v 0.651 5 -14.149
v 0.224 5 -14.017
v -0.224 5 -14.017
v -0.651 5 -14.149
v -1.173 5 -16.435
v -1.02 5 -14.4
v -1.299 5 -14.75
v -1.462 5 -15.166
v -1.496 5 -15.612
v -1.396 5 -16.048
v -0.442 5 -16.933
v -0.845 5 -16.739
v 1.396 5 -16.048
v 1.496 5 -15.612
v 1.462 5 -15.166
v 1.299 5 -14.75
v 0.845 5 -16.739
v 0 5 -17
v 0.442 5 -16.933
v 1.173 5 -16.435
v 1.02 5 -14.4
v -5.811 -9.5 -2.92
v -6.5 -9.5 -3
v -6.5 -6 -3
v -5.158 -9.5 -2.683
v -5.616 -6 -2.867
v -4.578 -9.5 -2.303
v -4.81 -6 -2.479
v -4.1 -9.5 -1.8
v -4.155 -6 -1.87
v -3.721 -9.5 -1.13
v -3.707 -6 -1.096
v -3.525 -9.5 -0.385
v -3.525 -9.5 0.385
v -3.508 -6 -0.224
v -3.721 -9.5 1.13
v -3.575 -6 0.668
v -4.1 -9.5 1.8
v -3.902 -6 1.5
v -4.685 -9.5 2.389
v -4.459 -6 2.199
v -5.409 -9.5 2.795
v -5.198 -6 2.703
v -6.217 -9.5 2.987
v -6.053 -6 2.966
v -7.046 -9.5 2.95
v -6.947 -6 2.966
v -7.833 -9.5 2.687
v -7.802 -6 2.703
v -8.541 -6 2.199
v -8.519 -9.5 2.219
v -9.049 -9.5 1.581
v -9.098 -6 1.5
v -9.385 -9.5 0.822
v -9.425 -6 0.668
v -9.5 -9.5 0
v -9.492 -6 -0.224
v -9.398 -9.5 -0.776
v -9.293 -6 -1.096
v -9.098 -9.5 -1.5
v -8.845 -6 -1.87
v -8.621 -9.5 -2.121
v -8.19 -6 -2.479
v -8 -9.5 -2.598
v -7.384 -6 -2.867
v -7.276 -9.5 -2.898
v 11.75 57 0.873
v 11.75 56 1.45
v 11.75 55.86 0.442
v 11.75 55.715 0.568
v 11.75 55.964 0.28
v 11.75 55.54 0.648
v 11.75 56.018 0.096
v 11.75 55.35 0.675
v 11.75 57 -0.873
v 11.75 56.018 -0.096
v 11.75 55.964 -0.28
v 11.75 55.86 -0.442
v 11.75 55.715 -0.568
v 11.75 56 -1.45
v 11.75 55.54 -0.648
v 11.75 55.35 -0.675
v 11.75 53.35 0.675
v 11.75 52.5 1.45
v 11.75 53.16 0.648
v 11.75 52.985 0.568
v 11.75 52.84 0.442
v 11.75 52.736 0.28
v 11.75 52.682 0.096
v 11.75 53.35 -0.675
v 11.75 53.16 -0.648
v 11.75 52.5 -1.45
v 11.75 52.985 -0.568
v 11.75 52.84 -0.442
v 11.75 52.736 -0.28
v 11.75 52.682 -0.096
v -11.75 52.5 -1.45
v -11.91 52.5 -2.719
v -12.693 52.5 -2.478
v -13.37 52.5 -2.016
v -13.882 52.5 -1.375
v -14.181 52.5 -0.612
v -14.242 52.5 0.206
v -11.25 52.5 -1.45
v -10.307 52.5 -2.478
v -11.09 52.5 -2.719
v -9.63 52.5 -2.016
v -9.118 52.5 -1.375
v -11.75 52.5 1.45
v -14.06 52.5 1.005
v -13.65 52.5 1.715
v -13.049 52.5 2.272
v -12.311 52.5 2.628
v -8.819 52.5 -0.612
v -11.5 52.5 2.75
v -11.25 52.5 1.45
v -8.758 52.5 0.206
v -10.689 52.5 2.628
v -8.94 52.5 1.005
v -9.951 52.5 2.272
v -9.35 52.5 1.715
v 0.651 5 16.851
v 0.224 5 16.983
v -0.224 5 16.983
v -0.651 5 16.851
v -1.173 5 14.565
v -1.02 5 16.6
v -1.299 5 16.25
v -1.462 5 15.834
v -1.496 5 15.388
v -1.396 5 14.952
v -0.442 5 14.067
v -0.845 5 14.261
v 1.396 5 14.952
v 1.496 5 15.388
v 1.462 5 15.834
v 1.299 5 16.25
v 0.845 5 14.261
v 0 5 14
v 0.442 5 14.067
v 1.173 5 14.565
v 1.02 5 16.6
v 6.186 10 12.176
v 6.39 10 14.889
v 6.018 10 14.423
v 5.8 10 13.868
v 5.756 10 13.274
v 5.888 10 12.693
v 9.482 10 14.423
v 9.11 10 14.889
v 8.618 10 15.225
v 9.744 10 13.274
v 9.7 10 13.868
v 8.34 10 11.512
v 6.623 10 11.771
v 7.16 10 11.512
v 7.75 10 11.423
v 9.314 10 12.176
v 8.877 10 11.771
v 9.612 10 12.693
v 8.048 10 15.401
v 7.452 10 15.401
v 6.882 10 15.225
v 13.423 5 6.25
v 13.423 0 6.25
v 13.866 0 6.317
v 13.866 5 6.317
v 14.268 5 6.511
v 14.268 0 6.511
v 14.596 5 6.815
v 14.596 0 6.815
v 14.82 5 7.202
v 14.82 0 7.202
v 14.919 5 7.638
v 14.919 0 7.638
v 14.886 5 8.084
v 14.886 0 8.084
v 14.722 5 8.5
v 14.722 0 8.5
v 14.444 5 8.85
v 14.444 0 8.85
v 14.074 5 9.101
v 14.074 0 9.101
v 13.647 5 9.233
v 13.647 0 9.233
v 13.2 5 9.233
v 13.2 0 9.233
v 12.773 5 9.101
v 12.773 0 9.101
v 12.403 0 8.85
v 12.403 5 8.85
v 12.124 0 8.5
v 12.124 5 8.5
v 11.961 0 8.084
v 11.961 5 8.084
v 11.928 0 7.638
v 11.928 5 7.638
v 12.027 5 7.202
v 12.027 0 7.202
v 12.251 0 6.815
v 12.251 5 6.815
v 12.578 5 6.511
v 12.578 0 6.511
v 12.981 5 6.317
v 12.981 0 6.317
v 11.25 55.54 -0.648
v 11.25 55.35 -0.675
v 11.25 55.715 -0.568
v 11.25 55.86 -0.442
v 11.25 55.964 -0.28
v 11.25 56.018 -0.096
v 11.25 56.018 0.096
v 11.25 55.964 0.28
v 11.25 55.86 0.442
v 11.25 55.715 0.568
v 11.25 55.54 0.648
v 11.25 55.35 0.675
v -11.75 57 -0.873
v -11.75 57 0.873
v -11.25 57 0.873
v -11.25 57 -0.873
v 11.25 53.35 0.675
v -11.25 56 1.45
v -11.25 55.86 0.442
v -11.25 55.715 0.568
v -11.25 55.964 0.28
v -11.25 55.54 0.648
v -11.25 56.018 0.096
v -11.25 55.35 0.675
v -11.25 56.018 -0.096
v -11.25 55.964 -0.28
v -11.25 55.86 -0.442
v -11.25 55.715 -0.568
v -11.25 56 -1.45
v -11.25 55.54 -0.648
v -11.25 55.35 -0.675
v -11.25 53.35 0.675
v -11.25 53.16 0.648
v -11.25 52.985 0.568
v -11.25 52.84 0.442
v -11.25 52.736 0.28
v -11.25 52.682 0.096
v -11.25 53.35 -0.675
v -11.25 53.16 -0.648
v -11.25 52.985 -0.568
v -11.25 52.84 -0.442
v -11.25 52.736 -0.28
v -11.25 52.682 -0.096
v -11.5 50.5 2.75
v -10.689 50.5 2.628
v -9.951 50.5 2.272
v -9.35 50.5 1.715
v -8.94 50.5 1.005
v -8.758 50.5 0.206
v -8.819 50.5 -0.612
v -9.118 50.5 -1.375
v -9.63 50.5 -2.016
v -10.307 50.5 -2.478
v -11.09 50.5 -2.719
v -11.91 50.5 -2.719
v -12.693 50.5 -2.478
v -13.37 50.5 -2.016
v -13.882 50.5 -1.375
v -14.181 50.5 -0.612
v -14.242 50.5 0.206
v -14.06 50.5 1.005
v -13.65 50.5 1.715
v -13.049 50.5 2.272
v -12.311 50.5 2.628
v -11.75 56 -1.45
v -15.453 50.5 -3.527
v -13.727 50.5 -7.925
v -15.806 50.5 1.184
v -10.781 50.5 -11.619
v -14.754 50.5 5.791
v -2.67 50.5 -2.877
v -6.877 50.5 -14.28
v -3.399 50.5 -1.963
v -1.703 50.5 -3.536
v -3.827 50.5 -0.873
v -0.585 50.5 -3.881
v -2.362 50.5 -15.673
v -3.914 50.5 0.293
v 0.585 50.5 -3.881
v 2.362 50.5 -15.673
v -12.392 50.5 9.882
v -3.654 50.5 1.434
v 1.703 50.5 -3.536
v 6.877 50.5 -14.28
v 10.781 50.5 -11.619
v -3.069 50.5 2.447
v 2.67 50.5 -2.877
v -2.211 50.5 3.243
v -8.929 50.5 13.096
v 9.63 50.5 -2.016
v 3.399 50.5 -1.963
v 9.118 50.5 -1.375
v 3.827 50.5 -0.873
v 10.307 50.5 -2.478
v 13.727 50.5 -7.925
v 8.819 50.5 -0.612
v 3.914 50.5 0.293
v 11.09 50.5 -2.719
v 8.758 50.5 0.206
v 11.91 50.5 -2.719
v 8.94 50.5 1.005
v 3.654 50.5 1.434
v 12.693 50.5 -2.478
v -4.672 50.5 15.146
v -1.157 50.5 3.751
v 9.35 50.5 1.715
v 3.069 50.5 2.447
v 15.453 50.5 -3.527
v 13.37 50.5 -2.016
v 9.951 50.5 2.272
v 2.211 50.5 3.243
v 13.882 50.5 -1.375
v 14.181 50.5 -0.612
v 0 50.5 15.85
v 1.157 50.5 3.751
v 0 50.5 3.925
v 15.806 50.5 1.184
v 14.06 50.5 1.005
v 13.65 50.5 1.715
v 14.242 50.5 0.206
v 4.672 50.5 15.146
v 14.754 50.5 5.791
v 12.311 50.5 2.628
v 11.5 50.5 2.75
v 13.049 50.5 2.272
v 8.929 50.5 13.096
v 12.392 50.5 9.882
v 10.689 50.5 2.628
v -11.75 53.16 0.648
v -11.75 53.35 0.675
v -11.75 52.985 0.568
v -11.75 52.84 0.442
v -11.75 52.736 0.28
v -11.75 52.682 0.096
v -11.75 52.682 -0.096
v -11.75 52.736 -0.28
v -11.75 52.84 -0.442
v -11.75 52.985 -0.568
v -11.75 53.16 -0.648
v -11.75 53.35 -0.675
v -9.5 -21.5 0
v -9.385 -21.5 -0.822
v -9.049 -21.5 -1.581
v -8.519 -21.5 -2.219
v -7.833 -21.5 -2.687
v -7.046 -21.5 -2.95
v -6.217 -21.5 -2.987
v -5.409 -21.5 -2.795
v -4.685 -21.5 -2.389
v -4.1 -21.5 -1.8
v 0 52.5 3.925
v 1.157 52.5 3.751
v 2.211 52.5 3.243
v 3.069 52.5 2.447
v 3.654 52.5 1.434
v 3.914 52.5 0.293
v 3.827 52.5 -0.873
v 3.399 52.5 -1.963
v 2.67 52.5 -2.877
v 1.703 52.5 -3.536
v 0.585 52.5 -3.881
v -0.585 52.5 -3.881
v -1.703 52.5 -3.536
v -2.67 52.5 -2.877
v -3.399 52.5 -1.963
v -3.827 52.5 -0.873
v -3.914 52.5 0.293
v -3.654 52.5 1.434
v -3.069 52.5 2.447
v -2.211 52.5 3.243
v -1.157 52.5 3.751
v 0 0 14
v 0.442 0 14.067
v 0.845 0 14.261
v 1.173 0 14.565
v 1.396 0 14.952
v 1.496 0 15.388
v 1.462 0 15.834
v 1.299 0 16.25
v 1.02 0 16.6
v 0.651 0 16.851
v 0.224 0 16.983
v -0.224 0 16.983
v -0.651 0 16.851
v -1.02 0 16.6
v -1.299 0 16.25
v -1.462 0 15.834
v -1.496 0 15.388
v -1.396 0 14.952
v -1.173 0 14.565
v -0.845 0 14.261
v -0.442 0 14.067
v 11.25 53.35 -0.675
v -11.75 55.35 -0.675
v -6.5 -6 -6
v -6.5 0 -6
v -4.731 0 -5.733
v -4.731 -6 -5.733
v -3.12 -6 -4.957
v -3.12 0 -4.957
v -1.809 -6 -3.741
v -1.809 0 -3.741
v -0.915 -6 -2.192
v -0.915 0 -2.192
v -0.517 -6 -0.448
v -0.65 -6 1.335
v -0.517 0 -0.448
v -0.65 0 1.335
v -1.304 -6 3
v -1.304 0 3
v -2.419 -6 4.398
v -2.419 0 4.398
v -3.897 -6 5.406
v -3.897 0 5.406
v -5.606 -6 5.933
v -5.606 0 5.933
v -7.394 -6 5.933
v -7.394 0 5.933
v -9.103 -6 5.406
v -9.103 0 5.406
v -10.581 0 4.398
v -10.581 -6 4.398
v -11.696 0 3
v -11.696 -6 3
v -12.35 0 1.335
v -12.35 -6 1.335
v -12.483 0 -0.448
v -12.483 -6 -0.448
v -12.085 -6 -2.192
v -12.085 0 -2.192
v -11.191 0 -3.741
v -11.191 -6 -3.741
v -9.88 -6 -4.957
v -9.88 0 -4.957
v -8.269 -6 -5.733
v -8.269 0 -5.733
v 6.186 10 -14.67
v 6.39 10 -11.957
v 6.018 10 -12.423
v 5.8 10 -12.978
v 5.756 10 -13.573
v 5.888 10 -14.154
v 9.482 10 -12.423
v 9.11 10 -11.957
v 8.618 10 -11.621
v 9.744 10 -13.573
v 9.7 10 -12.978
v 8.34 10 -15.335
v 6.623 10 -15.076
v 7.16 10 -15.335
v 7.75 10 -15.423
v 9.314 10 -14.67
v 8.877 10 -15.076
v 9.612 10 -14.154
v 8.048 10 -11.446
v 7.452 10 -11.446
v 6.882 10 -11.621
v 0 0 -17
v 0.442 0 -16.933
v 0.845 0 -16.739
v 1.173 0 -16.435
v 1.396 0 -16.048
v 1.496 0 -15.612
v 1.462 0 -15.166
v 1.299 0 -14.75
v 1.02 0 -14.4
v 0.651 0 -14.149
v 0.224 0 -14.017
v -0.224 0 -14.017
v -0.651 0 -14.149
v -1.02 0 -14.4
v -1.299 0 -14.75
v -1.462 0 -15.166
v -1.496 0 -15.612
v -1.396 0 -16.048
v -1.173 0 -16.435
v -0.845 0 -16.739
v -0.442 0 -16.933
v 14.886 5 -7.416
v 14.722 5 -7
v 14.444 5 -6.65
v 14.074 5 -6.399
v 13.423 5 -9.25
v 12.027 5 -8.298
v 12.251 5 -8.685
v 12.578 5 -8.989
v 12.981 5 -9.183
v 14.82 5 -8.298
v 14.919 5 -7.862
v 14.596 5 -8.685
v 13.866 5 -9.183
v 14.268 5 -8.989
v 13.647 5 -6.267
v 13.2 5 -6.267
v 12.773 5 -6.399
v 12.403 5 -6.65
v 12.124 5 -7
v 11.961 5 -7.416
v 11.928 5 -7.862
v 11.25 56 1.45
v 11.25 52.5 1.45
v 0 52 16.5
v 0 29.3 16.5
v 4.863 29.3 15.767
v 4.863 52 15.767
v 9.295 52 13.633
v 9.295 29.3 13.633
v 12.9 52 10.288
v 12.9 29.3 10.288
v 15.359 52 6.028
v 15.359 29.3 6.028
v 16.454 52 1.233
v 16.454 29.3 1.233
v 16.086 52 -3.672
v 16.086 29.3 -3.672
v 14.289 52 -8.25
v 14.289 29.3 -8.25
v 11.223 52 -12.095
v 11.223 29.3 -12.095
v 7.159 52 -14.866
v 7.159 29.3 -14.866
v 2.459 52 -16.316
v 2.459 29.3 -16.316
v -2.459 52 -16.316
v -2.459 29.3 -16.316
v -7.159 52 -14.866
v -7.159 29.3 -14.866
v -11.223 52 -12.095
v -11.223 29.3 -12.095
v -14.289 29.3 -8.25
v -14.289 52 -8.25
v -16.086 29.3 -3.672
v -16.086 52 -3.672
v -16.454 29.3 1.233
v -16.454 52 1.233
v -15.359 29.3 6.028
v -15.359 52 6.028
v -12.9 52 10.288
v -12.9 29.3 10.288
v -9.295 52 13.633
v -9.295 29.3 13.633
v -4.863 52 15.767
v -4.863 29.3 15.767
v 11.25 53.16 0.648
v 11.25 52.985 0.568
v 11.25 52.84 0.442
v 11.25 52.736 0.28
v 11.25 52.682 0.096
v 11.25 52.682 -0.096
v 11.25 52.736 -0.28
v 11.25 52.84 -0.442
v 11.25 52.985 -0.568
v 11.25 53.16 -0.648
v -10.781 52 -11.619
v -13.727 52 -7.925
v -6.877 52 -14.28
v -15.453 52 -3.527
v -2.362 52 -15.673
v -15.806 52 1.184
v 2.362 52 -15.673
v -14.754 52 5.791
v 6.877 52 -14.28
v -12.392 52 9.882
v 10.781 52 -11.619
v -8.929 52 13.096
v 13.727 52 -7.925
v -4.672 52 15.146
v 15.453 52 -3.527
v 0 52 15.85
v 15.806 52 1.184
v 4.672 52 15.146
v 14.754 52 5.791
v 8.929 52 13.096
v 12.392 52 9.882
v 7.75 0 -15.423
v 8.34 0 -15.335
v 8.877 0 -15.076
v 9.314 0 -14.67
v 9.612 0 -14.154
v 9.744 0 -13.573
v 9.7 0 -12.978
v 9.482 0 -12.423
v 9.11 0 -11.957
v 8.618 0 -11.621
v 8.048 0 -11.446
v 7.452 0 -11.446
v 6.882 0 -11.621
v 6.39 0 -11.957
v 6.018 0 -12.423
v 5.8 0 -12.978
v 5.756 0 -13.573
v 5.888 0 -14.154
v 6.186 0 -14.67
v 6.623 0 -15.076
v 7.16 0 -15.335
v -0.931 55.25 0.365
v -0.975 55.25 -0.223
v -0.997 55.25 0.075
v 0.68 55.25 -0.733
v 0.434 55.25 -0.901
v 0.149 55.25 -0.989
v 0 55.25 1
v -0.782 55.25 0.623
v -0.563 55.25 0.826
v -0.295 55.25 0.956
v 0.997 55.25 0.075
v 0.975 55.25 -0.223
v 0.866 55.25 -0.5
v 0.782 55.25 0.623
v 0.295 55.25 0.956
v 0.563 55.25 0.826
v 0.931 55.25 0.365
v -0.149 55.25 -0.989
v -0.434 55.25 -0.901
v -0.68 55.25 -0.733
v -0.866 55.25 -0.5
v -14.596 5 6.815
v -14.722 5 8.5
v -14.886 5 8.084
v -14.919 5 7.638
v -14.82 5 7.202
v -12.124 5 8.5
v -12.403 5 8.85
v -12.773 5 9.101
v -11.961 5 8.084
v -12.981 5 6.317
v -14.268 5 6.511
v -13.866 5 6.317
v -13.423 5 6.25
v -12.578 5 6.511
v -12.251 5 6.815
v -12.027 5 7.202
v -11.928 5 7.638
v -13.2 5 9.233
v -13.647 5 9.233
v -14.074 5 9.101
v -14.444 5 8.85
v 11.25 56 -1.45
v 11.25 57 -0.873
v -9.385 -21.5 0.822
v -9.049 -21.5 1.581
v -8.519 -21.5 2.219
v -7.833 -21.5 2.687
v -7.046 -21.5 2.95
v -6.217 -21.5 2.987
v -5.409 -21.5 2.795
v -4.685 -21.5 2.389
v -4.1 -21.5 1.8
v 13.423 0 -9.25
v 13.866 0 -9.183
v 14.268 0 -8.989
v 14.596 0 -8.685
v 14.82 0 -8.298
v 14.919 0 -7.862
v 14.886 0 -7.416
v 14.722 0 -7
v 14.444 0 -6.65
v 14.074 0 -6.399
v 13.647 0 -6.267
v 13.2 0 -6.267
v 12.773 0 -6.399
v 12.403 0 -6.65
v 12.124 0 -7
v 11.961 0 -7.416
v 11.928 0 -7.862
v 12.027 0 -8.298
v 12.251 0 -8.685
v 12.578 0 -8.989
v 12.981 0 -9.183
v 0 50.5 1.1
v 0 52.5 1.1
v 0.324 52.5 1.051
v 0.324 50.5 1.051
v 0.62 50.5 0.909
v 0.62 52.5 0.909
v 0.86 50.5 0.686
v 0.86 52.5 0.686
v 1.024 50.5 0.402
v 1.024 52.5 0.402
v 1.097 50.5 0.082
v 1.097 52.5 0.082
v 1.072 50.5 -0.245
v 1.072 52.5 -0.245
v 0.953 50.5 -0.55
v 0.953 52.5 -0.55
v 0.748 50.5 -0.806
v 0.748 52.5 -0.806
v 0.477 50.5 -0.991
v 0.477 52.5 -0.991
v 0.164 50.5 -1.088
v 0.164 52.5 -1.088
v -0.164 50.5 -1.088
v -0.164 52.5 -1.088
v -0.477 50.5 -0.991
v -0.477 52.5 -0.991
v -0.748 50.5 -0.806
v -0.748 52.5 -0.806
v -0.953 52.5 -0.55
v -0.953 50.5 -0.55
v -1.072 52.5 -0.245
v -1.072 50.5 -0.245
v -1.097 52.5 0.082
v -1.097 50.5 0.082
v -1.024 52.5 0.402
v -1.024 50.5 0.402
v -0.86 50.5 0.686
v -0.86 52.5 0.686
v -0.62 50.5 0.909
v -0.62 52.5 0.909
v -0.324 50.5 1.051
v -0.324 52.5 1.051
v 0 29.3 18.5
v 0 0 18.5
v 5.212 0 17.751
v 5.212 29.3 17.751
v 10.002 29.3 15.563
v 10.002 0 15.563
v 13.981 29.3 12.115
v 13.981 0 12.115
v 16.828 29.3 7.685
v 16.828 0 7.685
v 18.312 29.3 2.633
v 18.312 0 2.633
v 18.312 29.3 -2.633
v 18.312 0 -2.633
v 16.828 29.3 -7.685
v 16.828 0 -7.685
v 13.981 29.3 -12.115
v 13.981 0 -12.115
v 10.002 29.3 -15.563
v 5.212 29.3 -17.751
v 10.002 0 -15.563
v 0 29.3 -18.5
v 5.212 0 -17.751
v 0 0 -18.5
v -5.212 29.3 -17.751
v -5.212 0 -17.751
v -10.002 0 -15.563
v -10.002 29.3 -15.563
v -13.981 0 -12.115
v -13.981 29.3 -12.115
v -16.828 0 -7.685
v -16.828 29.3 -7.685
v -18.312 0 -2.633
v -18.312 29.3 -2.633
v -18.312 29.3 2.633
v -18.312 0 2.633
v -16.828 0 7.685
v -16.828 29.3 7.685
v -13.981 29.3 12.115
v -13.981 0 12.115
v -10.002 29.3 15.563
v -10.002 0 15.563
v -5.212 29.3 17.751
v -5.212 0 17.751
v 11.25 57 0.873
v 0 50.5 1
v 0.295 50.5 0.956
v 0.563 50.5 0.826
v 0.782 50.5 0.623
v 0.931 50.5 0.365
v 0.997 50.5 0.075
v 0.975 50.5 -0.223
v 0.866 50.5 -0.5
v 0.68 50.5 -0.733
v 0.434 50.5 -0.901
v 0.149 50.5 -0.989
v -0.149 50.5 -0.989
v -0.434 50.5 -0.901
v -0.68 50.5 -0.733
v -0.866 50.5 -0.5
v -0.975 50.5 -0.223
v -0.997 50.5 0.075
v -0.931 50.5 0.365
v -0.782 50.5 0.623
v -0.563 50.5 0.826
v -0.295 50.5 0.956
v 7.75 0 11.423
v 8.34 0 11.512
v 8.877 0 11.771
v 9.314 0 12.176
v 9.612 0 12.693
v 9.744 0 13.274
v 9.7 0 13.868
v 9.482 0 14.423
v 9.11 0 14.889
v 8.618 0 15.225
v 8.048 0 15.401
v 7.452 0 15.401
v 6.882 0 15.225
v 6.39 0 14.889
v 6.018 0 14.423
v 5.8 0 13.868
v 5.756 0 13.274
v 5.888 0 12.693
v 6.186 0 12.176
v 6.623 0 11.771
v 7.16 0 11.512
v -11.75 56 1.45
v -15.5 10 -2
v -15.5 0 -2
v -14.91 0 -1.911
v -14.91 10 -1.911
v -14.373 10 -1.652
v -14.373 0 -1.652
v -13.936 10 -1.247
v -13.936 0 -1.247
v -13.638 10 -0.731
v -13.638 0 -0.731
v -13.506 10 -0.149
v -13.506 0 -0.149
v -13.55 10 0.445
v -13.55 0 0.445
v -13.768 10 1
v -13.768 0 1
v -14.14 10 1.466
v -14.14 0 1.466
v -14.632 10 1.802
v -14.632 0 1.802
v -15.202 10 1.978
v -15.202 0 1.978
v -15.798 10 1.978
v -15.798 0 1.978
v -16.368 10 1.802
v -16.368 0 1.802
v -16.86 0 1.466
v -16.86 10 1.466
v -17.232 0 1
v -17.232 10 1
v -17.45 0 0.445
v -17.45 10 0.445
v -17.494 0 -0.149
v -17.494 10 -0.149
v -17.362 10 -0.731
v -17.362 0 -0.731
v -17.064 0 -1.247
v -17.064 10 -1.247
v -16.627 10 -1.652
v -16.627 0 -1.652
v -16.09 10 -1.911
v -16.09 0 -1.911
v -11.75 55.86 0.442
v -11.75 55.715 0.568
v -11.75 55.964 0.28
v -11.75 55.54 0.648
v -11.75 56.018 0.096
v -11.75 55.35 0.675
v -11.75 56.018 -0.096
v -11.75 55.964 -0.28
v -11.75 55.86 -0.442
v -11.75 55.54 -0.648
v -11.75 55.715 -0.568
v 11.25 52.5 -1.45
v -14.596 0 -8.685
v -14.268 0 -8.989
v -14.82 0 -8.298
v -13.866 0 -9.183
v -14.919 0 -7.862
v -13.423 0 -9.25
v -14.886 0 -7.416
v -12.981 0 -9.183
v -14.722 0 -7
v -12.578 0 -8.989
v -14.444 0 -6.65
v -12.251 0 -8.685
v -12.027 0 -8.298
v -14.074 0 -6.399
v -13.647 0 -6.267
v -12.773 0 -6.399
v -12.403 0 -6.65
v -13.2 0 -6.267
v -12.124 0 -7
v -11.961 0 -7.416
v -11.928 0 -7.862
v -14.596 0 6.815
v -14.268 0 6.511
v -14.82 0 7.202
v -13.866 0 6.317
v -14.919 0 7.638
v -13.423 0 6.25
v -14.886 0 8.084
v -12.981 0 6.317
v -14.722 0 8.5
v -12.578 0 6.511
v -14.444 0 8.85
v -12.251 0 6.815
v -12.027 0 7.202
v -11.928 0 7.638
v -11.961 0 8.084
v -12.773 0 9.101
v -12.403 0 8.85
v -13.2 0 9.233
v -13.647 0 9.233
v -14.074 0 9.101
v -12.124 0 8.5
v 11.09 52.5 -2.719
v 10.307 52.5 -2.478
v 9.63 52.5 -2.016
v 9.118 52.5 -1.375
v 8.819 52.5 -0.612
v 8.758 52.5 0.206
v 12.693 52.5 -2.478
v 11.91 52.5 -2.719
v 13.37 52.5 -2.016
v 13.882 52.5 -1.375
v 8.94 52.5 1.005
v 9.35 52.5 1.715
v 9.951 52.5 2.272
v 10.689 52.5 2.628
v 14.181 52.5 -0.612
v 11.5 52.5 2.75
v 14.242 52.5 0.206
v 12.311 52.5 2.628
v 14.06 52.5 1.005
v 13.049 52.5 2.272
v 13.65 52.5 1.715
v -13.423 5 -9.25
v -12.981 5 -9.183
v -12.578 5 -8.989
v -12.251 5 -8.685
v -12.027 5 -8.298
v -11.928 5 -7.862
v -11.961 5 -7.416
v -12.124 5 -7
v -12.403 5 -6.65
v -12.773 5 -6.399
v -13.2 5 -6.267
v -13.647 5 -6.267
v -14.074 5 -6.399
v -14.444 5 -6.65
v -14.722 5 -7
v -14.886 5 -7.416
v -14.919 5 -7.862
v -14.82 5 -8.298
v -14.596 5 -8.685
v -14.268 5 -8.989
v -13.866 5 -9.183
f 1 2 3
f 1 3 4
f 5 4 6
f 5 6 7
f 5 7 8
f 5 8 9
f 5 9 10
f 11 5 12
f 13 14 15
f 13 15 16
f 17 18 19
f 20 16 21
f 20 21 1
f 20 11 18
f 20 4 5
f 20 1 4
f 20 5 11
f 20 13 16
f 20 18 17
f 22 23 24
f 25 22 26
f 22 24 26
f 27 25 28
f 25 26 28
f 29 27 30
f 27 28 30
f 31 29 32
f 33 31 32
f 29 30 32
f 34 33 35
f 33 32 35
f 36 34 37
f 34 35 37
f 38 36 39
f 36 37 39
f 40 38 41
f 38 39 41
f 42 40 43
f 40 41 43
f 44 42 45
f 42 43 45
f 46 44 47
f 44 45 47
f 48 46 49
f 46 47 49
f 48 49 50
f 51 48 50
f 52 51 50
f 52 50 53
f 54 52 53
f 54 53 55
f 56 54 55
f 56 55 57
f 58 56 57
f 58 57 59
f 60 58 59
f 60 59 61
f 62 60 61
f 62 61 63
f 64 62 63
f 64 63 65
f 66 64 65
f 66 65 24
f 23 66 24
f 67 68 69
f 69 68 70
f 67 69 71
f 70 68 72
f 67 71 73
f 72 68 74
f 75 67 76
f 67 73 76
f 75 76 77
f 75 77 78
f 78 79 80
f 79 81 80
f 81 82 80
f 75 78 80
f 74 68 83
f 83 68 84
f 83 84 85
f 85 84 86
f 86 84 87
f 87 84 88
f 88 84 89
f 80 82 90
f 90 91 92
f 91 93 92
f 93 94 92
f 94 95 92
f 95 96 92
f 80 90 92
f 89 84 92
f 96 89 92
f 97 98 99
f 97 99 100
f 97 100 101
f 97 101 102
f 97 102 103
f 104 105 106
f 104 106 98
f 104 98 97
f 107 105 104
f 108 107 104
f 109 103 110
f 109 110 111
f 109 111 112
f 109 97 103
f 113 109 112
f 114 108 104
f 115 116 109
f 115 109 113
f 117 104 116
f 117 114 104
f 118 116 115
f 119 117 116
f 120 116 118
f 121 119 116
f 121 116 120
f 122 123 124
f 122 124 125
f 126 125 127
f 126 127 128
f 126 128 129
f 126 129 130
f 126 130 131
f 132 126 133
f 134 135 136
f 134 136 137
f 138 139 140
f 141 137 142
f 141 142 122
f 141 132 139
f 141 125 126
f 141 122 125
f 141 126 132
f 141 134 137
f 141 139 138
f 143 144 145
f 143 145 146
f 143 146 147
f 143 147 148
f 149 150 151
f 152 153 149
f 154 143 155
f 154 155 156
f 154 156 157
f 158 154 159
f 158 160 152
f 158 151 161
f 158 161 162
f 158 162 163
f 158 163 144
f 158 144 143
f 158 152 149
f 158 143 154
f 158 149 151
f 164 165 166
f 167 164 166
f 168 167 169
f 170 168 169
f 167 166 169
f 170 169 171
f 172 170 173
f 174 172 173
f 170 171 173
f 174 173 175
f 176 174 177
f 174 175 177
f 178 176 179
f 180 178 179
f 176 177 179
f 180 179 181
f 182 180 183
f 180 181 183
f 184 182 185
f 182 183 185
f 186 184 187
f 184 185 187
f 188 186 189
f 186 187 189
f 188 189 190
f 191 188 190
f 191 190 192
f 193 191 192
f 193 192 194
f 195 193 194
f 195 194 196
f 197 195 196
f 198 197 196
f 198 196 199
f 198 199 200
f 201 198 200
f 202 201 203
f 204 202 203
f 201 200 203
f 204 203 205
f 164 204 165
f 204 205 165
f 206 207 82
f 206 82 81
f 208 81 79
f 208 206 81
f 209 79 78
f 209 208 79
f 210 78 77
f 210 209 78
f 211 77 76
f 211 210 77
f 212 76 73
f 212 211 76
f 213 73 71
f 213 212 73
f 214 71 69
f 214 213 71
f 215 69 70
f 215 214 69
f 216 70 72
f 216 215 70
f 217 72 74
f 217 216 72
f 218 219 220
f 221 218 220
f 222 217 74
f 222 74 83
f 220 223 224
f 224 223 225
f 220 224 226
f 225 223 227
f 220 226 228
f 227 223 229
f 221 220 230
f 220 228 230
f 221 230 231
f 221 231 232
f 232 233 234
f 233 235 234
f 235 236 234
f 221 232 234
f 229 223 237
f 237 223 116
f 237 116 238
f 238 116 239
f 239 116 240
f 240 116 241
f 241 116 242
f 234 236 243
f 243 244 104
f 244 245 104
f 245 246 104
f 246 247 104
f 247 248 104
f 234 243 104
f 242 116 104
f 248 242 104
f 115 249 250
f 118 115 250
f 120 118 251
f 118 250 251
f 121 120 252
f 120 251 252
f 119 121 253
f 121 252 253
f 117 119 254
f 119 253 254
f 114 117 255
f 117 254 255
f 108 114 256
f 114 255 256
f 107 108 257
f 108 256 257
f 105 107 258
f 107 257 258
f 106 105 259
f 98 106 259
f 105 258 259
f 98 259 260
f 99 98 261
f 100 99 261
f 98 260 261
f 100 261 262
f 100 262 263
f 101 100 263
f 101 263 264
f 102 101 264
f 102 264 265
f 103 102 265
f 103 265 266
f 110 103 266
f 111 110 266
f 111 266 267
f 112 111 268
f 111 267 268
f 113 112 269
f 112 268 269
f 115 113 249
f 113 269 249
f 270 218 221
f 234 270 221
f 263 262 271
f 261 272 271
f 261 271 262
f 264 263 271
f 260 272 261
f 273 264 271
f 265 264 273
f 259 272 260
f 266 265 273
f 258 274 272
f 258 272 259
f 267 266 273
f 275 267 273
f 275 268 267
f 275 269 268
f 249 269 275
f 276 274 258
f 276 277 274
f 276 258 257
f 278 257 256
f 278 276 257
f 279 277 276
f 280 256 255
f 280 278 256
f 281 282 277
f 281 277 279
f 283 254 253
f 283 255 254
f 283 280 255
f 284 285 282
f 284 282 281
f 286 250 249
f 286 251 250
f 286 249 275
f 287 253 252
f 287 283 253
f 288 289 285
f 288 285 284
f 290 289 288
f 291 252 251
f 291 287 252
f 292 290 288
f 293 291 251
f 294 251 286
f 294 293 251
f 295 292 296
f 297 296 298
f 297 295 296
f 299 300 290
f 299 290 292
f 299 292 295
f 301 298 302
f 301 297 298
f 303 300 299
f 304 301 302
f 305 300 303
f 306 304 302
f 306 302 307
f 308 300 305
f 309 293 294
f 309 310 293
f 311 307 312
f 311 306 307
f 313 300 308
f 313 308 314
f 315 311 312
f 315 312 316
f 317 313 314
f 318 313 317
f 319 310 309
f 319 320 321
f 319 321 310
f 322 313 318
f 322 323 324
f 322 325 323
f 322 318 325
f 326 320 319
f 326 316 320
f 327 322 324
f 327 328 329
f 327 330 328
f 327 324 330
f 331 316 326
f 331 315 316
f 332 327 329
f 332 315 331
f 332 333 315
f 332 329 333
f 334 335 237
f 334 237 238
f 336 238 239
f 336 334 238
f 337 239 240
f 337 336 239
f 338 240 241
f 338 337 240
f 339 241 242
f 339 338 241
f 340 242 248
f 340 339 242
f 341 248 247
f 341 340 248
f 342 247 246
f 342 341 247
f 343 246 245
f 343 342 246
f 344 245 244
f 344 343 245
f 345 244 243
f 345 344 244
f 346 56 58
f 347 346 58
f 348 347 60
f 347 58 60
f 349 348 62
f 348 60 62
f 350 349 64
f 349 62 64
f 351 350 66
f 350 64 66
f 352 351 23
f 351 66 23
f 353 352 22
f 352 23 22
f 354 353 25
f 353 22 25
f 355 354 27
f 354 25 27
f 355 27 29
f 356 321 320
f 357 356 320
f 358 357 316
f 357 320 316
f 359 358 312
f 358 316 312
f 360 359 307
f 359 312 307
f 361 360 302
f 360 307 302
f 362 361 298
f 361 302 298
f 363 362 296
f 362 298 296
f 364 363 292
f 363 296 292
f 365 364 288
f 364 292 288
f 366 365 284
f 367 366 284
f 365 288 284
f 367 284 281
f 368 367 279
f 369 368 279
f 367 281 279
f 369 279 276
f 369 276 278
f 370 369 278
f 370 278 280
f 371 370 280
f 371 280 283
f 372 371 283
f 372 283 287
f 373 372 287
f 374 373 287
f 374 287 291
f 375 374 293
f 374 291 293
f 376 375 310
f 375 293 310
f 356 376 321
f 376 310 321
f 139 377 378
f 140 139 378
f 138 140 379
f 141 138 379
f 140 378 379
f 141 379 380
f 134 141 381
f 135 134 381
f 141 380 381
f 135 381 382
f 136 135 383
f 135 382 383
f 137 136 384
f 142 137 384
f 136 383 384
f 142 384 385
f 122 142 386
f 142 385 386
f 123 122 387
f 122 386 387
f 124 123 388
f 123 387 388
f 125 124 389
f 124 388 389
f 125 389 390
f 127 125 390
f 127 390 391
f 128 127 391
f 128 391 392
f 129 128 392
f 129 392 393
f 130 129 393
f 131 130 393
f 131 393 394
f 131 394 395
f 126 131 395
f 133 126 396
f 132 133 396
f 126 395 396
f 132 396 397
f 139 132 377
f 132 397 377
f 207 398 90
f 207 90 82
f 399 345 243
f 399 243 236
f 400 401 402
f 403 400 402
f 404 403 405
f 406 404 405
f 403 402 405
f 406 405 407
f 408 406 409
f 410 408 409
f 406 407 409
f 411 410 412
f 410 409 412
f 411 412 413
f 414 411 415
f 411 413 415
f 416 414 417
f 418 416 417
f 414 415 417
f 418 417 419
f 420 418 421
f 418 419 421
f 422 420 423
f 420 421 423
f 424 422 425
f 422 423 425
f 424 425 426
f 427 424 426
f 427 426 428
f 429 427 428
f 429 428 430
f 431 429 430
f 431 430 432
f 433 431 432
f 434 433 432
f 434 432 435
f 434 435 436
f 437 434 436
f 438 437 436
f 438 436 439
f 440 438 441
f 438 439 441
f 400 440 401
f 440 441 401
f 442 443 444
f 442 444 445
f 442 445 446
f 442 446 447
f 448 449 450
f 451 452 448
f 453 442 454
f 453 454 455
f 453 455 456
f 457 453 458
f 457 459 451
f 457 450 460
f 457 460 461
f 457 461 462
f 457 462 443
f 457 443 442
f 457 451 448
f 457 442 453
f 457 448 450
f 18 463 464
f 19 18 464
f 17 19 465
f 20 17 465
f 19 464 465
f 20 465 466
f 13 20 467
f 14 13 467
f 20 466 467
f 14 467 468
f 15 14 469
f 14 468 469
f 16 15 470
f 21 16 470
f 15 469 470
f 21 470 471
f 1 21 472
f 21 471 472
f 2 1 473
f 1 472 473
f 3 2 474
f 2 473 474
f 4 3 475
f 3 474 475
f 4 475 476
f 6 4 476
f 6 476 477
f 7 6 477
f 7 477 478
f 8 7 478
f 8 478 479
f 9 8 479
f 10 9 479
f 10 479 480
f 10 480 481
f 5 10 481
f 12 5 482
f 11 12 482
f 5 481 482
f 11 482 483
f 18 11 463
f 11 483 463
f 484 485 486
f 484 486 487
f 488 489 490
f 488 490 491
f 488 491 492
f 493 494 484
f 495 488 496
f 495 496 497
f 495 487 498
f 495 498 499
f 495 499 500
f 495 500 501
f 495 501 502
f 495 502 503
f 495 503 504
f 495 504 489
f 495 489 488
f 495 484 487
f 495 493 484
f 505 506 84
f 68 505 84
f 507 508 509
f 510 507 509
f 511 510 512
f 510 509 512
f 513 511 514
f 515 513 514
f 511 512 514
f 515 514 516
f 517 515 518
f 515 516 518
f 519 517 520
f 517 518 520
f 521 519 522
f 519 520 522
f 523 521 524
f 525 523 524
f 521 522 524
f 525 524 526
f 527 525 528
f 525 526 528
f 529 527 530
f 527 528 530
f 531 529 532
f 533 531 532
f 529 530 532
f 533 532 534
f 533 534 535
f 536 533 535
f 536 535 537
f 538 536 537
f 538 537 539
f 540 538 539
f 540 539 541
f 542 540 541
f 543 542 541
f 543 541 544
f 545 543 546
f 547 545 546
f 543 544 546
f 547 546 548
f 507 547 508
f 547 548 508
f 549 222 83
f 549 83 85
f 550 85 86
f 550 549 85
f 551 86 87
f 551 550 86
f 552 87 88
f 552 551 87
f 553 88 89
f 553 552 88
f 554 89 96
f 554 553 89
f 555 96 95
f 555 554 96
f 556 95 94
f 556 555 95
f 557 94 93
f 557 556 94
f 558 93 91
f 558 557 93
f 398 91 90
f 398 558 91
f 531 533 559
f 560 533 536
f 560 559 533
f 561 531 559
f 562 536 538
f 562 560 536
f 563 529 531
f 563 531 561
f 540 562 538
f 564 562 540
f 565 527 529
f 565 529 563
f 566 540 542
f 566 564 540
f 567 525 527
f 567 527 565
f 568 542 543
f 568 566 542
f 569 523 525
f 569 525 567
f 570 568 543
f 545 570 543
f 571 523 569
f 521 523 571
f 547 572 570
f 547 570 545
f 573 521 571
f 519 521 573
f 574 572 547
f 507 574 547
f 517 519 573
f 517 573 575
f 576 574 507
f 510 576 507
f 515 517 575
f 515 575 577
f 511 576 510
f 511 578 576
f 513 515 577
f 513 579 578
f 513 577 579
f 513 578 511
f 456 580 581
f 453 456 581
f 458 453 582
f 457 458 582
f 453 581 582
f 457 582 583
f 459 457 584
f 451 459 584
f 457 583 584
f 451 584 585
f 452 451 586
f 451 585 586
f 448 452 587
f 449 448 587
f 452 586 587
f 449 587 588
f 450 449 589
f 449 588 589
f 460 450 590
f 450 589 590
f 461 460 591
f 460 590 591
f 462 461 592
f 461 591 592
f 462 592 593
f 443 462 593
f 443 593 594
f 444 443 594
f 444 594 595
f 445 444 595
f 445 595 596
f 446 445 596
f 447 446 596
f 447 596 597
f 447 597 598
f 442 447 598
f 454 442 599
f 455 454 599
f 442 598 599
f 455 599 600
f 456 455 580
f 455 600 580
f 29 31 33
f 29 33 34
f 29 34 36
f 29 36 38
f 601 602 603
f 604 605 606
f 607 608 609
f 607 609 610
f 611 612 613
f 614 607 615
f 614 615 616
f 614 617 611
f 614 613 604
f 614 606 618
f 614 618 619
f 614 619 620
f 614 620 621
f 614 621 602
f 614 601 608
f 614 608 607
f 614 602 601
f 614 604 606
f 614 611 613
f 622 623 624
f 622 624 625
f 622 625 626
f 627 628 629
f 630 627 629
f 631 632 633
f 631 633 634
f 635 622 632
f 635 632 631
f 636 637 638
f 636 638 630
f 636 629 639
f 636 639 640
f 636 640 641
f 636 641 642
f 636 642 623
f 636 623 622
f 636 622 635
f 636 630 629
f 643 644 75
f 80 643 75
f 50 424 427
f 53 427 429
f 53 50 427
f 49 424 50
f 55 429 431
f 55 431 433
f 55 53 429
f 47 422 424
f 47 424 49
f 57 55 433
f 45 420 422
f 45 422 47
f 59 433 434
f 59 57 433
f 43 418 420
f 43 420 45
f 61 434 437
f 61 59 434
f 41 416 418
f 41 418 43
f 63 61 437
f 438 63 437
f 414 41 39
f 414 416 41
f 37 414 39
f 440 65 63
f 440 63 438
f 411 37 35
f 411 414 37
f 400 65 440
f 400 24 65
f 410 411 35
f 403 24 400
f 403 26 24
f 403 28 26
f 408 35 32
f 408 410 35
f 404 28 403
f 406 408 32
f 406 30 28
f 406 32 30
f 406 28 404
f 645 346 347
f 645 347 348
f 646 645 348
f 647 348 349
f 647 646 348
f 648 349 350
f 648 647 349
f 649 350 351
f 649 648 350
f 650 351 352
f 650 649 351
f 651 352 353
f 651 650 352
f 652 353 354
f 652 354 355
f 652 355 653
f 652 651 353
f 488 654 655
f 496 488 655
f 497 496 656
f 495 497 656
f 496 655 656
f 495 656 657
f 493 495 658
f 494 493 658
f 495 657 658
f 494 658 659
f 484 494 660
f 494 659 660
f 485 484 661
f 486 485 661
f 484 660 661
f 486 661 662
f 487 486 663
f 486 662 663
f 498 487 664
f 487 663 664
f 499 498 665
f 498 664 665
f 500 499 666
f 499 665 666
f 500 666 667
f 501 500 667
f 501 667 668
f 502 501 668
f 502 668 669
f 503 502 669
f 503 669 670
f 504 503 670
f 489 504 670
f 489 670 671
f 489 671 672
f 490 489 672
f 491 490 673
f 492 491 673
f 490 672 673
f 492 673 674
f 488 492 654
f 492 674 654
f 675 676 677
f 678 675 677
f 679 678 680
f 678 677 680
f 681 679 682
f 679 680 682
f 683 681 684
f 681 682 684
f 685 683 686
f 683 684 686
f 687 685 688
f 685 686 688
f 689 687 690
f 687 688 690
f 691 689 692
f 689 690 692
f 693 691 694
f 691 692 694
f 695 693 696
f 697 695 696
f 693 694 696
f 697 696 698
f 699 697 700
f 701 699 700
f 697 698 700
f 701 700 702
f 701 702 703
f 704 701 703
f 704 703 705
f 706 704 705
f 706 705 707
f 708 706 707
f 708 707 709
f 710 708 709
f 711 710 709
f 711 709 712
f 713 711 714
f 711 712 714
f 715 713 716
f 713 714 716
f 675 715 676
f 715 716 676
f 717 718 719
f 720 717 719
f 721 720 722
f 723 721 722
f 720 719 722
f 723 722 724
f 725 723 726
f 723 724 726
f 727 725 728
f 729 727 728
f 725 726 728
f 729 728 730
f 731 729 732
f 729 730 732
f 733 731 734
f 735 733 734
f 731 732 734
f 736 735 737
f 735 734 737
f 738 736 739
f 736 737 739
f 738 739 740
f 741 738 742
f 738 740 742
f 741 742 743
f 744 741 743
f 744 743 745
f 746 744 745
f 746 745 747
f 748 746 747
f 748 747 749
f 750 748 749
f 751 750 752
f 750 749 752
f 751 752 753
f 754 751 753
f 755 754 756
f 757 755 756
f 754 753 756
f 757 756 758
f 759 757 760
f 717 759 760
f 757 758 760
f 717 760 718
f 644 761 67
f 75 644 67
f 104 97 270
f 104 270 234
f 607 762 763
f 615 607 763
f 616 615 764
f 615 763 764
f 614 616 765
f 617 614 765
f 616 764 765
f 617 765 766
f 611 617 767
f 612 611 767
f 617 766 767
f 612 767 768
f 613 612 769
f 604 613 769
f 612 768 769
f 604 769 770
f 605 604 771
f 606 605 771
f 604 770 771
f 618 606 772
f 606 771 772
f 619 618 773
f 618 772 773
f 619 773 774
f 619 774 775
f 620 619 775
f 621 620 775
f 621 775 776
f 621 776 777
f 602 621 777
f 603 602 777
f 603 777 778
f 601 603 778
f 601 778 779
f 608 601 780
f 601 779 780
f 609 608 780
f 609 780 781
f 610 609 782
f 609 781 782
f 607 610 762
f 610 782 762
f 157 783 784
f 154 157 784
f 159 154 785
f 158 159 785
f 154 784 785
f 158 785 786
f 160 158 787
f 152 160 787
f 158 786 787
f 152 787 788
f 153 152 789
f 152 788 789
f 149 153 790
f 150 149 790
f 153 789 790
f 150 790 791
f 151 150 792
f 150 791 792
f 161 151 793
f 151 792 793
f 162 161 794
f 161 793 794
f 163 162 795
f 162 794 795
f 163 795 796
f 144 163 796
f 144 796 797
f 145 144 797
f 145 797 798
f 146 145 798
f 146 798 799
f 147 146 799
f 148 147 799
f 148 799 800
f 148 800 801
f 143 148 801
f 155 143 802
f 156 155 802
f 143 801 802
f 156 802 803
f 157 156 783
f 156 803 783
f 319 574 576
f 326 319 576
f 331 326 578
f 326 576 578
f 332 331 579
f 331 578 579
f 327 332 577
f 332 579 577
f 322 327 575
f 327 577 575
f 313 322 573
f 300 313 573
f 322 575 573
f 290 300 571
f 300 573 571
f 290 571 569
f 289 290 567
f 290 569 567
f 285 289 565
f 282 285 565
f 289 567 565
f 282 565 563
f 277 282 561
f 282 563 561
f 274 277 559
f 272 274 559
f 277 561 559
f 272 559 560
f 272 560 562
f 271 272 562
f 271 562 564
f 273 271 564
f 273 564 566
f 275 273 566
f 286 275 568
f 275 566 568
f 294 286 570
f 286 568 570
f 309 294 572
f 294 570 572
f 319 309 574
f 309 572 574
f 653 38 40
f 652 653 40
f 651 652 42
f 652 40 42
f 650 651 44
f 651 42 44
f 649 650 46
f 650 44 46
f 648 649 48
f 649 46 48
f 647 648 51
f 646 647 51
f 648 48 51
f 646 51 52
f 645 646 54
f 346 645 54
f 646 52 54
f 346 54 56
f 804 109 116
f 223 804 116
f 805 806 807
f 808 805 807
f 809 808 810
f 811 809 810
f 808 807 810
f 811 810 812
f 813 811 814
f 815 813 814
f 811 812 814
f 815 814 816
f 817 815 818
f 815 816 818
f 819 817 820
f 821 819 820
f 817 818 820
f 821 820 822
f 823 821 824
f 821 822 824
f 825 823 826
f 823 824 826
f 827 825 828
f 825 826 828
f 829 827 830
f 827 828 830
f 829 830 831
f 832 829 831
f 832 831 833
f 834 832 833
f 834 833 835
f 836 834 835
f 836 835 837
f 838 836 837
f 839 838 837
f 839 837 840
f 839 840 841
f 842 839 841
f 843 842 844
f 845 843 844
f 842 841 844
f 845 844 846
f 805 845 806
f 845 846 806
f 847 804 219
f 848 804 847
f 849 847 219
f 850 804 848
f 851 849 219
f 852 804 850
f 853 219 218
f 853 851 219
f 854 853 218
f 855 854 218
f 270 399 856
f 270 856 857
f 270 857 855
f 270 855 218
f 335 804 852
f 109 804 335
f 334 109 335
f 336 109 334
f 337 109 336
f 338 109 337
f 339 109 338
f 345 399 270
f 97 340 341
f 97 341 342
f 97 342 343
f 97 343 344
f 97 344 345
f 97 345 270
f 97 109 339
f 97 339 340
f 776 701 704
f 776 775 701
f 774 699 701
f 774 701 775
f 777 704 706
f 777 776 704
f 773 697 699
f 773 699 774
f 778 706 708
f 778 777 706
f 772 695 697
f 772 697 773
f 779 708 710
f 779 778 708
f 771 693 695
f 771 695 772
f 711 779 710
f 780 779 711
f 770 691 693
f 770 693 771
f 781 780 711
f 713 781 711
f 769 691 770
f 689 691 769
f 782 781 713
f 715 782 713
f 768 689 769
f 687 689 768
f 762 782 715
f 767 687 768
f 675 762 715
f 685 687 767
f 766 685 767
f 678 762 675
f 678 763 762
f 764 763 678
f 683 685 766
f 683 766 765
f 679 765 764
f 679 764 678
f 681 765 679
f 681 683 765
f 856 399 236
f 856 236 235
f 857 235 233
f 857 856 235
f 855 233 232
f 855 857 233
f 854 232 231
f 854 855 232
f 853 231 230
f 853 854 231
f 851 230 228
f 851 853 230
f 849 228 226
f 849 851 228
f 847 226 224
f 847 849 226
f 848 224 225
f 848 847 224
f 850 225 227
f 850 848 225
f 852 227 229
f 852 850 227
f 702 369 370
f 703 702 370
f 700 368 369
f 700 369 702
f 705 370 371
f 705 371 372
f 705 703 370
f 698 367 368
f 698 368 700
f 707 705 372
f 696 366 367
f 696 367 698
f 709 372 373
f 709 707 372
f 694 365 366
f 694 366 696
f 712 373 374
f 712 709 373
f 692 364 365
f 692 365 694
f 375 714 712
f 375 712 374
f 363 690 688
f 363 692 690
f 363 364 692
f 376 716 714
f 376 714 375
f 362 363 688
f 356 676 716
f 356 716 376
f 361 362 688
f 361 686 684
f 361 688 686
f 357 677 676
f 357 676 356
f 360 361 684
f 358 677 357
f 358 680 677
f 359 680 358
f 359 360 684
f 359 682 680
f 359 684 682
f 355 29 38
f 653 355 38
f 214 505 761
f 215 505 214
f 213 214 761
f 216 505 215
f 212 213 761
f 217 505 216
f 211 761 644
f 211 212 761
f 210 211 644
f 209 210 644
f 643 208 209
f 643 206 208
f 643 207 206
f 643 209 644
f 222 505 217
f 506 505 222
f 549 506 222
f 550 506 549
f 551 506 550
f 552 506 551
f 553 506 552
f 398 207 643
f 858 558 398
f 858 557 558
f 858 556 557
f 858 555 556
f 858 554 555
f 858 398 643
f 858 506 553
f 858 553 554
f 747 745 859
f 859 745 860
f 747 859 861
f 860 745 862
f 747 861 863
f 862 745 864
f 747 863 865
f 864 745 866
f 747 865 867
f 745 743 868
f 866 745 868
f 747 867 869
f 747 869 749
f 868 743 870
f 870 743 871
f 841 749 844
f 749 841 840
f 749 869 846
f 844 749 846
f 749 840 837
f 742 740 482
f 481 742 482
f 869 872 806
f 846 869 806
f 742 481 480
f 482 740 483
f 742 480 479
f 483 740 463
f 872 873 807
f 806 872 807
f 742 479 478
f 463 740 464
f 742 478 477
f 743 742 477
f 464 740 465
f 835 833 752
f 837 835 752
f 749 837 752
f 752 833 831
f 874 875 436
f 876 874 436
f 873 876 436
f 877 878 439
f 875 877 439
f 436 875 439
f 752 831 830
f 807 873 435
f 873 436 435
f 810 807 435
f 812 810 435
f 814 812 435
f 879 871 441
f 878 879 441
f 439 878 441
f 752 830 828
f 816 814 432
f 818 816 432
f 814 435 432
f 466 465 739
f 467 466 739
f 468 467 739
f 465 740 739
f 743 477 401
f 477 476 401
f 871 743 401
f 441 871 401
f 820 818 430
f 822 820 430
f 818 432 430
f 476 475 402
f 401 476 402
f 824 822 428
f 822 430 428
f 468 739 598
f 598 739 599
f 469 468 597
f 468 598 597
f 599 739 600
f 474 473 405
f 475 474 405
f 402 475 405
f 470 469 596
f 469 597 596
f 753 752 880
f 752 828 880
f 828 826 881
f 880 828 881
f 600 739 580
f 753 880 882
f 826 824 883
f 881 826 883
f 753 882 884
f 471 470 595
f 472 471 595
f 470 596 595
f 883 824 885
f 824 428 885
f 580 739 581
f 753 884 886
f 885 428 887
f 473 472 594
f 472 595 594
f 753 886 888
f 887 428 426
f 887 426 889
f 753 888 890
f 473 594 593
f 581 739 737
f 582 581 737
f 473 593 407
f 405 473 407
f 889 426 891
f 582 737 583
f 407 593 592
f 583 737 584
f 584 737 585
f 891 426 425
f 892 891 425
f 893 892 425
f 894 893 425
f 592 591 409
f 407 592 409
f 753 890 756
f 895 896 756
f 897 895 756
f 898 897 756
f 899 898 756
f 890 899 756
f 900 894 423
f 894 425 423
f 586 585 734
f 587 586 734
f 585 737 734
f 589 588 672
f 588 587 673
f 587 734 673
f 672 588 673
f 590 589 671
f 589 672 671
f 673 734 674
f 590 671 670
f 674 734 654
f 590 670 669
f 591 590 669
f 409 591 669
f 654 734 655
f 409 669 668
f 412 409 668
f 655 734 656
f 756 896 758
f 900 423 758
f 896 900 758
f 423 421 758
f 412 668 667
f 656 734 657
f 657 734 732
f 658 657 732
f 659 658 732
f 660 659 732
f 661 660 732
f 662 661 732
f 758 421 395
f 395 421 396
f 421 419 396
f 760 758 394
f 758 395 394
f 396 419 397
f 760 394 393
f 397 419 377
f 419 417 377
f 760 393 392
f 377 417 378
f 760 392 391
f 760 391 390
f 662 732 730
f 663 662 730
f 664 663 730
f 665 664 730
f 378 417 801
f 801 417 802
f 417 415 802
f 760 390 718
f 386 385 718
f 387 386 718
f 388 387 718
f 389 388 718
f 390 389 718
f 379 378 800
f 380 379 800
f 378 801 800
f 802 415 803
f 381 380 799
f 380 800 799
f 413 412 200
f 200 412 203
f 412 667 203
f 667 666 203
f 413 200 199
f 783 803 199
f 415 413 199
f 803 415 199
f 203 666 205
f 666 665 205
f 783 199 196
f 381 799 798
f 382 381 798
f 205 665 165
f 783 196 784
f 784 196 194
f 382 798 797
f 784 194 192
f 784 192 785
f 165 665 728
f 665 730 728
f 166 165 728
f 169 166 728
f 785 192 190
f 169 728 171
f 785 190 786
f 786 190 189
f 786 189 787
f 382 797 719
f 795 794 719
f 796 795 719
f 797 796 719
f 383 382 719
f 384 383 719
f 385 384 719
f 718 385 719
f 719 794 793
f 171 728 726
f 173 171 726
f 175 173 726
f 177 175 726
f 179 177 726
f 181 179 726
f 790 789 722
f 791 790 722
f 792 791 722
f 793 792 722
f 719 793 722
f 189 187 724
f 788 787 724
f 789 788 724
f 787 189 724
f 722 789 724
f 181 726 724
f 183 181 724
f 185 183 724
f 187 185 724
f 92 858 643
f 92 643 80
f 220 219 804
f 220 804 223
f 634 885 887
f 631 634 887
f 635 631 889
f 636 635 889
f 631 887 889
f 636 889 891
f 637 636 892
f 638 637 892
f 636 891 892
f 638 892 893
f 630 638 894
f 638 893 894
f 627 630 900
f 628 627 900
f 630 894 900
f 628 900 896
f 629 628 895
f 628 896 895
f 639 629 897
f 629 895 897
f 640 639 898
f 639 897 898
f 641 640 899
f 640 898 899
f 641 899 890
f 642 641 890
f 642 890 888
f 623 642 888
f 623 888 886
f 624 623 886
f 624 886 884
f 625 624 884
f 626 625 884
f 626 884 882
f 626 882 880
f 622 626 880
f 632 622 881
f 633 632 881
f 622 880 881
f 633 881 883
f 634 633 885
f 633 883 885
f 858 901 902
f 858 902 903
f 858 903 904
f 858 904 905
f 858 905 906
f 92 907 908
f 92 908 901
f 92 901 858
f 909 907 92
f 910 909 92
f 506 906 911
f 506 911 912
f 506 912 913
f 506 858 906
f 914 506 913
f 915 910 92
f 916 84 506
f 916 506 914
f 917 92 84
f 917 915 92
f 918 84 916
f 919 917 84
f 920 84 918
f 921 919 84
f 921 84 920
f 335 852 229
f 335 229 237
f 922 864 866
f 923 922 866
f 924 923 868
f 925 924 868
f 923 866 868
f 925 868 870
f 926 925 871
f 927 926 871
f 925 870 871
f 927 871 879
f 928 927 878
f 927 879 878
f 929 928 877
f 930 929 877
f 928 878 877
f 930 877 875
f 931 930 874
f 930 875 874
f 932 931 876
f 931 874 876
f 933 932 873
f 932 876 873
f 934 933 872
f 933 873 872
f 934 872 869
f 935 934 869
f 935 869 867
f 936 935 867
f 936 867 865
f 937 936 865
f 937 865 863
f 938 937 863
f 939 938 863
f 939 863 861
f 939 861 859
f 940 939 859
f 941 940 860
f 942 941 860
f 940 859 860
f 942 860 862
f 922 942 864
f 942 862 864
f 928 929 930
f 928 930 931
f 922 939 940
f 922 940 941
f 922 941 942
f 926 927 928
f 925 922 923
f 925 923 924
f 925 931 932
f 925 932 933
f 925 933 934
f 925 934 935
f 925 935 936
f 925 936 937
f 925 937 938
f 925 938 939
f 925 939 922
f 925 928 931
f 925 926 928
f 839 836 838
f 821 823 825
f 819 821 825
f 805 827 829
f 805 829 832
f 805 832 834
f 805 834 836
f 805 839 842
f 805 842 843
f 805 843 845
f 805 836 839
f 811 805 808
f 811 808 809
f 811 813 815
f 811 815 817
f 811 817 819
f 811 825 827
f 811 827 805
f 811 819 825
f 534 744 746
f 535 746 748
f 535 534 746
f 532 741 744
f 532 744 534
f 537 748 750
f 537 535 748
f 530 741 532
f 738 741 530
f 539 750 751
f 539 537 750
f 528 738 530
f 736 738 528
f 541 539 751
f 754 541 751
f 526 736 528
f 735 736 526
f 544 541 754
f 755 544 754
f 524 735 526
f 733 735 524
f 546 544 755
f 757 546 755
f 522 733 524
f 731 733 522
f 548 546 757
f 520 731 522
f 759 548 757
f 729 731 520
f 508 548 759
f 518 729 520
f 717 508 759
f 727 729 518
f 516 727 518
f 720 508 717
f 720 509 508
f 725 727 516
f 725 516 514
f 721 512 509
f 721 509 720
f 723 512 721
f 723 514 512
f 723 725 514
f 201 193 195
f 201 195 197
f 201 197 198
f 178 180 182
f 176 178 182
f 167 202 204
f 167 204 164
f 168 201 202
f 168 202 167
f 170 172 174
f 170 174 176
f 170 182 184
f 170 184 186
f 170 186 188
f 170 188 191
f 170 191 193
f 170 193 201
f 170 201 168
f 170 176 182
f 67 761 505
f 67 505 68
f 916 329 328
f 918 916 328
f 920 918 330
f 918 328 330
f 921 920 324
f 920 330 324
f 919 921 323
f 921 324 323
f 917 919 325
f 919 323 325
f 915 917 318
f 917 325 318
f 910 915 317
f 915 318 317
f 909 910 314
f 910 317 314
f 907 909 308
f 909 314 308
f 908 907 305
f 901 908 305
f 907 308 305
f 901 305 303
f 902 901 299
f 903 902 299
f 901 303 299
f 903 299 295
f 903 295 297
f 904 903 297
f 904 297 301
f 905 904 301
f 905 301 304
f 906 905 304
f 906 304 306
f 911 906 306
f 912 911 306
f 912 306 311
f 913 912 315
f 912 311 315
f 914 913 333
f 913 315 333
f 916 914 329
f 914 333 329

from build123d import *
from OCP.BRepFilletAPI import BRepFilletAPI_MakeChamfer

# Parameters (mm, degrees)
SCHIZZO1_R                   = 18.5
ESTRUSIONE_ESTRUSIONE1_DEPTH = 29.3
SCHIZZO2_R                   = 16.5
ESTRUSIONE_ESTRUSIONE2_DEPTH = 22.7
SCHIZZO3_R                   = 15.85
TAGLIO_ESTRUSIONE1_DEPTH     = 1.5
SCHIZZO4_R                   = 2.75
SCHIZZO4_R_2                 = 3.925
ESTRUSIONE_ESTRUSIONE3_DEPTH = 2
SCHIZZO5_W                   = 0.5
SCHIZZO5_H                   = 2.9
ESTRUSIONE_ESTRUSIONE4_DEPTH = 4.5
SMUSSO1_SIZE                 = 1
SMUSSO1_SIZE2                = 0.577350269
TAGLIO_ESTRUSIONE2_DEPTH     = 68.129073433
SCHIZZO7_R                   = 1.1
TAGLIO_ESTRUSIONE3_DEPTH     = 2
SCHIZZO8_R                   = 1
ESTRUSIONE_ESTRUSIONE5_DEPTH = 4.75
SCHIZZO9_R                   = 1.5
TAGLIO_ESTRUSIONE4_DEPTH     = 5
SCHIZZO10_R                  = 6
ESTRUSIONE_ESTRUSIONE6_DEPTH = 6
SCHIZZO11_R                  = 3
ESTRUSIONE_ESTRUSIONE7_DEPTH = 3.5
ESTRUSIONE_ESTRUSIONE8_DEPTH = 12
CROQUIS1_R                   = 2
CORTAR_EXTRUIR1_DEPTH        = 10


with BuildPart() as part:
    # Schizzo1 → Estrusione-Estrusione1 (new body)
    with BuildSketch(Plane(origin=(0, 0, 0), x_dir=(1, 0, 0), z_dir=(0, 1, 0))):
        with Locations(Location((0, 0, 0), (0, 0, 270))):
            Circle(SCHIZZO1_R)
    extrude(amount=ESTRUSIONE_ESTRUSIONE1_DEPTH)

    # Schizzo2 → Estrusione-Estrusione2 (add)
    with BuildSketch(Plane(origin=(0, 29.3, 0), x_dir=(1, 0, 0), z_dir=(0, 1, 0))):
        with Locations(Location((0, 0, 0), (0, 0, 270))):
            Circle(SCHIZZO2_R)
    extrude(amount=ESTRUSIONE_ESTRUSIONE2_DEPTH)

    # Schizzo3 → Taglio-Estrusione1 (cut)
    with BuildSketch(Plane(origin=(0, 52, 0), x_dir=(1, 0, 0), z_dir=(0, 1, 0))):
        with Locations(Location((0, 0, 0), (0, 0, 270))):
            Circle(SCHIZZO3_R)
    extrude(amount=-TAGLIO_ESTRUSIONE1_DEPTH, mode=Mode.SUBTRACT)

    # Schizzo4 → Estrusione-Estrusione3 (add)
    with BuildSketch(Plane(origin=(0, 50.5, 0), x_dir=(1, 0, 0), z_dir=(0, 1, 0))):
        with Locations(Location((11.5, 0, 0), (0, 0, 270))):
            Circle(SCHIZZO4_R)
        with Locations(Location((-11.5, 0, 0), (0, 0, 270))):
            Circle(SCHIZZO4_R)
        with Locations(Location((0, 0, 0), (0, 0, 270))):
            Circle(SCHIZZO4_R_2)
    extrude(amount=ESTRUSIONE_ESTRUSIONE3_DEPTH)

    # Schizzo5 → Estrusione-Estrusione4 (add)
    with BuildSketch(Plane(origin=(0, 52.5, 0), x_dir=(1, 0, 0), z_dir=(0, 1, 0))):
        with Locations((-11.5, 0)):
            Rectangle(SCHIZZO5_W, SCHIZZO5_H)
        with Locations((11.5, 0)):
            Rectangle(SCHIZZO5_W, SCHIZZO5_H)
    extrude(amount=ESTRUSIONE_ESTRUSIONE4_DEPTH)

    # Smusso1: one chamfer whose edges measure the first distance from different faces: ONE call of the kernel's chamfer builder (chamfer() names one face for all edges)
    smusso1_edges_1 = [part.edges().sort_by_distance(p)[0] for p in [
        (-11.5, 57, -1.45),
    ]]
    smusso1_side_1 = [part.faces().sort_by_distance(p)[0] for p in [
        (-11.5, 54.75, -1.45),
    ]]
    smusso1_edges_2 = [part.edges().sort_by_distance(p)[0] for p in [
        (-11.5, 57, 1.45),
    ]]
    smusso1_side_2 = [part.faces().sort_by_distance(p)[0] for p in [
        (-11.5, 54.75, 1.45),
    ]]
    smusso1_edges_3 = [part.edges().sort_by_distance(p)[0] for p in [
        (11.5, 57, -1.45),
    ]]
    smusso1_side_3 = [part.faces().sort_by_distance(p)[0] for p in [
        (11.5, 54.75, -1.45),
    ]]
    smusso1_edges_4 = [part.edges().sort_by_distance(p)[0] for p in [
        (11.5, 57, 1.45),
    ]]
    smusso1_side_4 = [part.faces().sort_by_distance(p)[0] for p in [
        (11.5, 54.75, 1.45),
    ]]
    smusso1 = BRepFilletAPI_MakeChamfer(part.part.solid().wrapped)
    for e in smusso1_edges_1:
        smusso1.Add(SMUSSO1_SIZE, SMUSSO1_SIZE2, e.wrapped, smusso1_side_1[0].wrapped)  # the first distance lies on this face
    for e in smusso1_edges_2:
        smusso1.Add(SMUSSO1_SIZE, SMUSSO1_SIZE2, e.wrapped, smusso1_side_2[0].wrapped)  # the first distance lies on this face
    for e in smusso1_edges_3:
        smusso1.Add(SMUSSO1_SIZE, SMUSSO1_SIZE2, e.wrapped, smusso1_side_3[0].wrapped)  # the first distance lies on this face
    for e in smusso1_edges_4:
        smusso1.Add(SMUSSO1_SIZE, SMUSSO1_SIZE2, e.wrapped, smusso1_side_4[0].wrapped)  # the first distance lies on this face
    add(Compound.cast(smusso1.Shape()), mode=Mode.REPLACE)

    # Schizzo6 → Taglio-Estrusione2 (cut, through all)
    with BuildSketch(Plane.ZY.offset(11.75)):
        with BuildLine():
            Line((0.675, 55.35), (0.675, 53.35))
            ThreePointArc((0.675, 53.35), (0, 52.675), (-0.675, 53.35))
            Line((-0.675, 53.35), (-0.675, 55.35))
            ThreePointArc((-0.675, 55.35), (0, 56.025), (0.675, 55.35))
        make_face()
    extrude(amount=-TAGLIO_ESTRUSIONE2_DEPTH, mode=Mode.SUBTRACT)

    # Schizzo7 → Taglio-Estrusione3 (cut)
    with BuildSketch(Plane(origin=(0, 52.5, 0), x_dir=(1, 0, 0), z_dir=(0, 1, 0))):
        with Locations(Location((0, 0, 0), (0, 0, 270))):
            Circle(SCHIZZO7_R)
    extrude(amount=-TAGLIO_ESTRUSIONE3_DEPTH, mode=Mode.SUBTRACT)

    # Schizzo8 → Estrusione-Estrusione5 (add)
    with BuildSketch(Plane(origin=(0, 50.5, 0), x_dir=(1, 0, 0), z_dir=(0, 1, 0))):
        with Locations(Location((0, 0, 0), (0, 0, 270))):
            Circle(SCHIZZO8_R)
    extrude(amount=ESTRUSIONE_ESTRUSIONE5_DEPTH)

    # Schizzo9 → Taglio-Estrusione4 (cut)
    with BuildSketch(Plane.XZ):
        with Locations(Location((0, -15.5, 0), (0, 0, 270))):
            Circle(SCHIZZO9_R)
        with Locations(Location((-13.423393759, -7.75, 0), (0, 0, 270))):
            Circle(SCHIZZO9_R)
        with Locations(Location((-13.423393759, 7.75, 0), (0, 0, 270))):
            Circle(SCHIZZO9_R)
        with Locations(Location((0, 15.5, 0), (0, 0, 270))):
            Circle(SCHIZZO9_R)
        with Locations(Location((13.423393759, 7.75, 0), (0, 0, 270))):
            Circle(SCHIZZO9_R)
        with Locations(Location((13.423393759, -7.75, 0), (0, 0, 270))):
            Circle(SCHIZZO9_R)
    extrude(amount=-TAGLIO_ESTRUSIONE4_DEPTH, mode=Mode.SUBTRACT)

    # Schizzo10 → Estrusione-Estrusione6 (add)
    with BuildSketch(Plane.XZ):
        with Locations(Location((-6.5, 0, 0), (0, 0, 270))):
            Circle(SCHIZZO10_R)
    extrude(amount=ESTRUSIONE_ESTRUSIONE6_DEPTH)

    # Schizzo11 → Estrusione-Estrusione7 (add)
    with BuildSketch(Plane.XZ.offset(6)):
        with Locations(Location((-6.5, 0, 0), (0, 0, 270))):
            Circle(SCHIZZO11_R)
    extrude(amount=ESTRUSIONE_ESTRUSIONE7_DEPTH)

    # Schizzo12 → Estrusione-Estrusione8 (add)
    with BuildSketch(Plane.XZ.offset(9.5)):
        with BuildLine():
            ThreePointArc((-9.5, 0), (-7.448683298, -2.846049894), (-4.1, -1.8))
            Line((-4.1, -1.8), (-4.1, 0))
            Line((-4.1, 0), (-9.5, 0))
        make_face()
        with BuildLine():
            Line((-9.5, 0), (-4.1, 0))
            Line((-4.1, 0), (-4.1, 1.8))
            ThreePointArc((-4.1, 1.8), (-7.448683298, 2.846049894), (-9.5, 0))
        make_face()
    extrude(amount=ESTRUSIONE_ESTRUSIONE8_DEPTH)

    # Croquis1 → Cortar-Extruir1 (cut)
    with BuildSketch(Plane.XZ):
        with Locations(Location((7.75, -13.423393759, 0), (0, 0, 270))):
            Circle(CROQUIS1_R)
        with Locations(Location((-15.5, 0, 0), (0, 0, 270))):
            Circle(CROQUIS1_R)
        with Locations(Location((7.75, 13.423393759, 0), (0, 0, 270))):
            Circle(CROQUIS1_R)
    extrude(amount=-CORTAR_EXTRUIR1_DEPTH, mode=Mode.SUBTRACT)


solid = part.part
